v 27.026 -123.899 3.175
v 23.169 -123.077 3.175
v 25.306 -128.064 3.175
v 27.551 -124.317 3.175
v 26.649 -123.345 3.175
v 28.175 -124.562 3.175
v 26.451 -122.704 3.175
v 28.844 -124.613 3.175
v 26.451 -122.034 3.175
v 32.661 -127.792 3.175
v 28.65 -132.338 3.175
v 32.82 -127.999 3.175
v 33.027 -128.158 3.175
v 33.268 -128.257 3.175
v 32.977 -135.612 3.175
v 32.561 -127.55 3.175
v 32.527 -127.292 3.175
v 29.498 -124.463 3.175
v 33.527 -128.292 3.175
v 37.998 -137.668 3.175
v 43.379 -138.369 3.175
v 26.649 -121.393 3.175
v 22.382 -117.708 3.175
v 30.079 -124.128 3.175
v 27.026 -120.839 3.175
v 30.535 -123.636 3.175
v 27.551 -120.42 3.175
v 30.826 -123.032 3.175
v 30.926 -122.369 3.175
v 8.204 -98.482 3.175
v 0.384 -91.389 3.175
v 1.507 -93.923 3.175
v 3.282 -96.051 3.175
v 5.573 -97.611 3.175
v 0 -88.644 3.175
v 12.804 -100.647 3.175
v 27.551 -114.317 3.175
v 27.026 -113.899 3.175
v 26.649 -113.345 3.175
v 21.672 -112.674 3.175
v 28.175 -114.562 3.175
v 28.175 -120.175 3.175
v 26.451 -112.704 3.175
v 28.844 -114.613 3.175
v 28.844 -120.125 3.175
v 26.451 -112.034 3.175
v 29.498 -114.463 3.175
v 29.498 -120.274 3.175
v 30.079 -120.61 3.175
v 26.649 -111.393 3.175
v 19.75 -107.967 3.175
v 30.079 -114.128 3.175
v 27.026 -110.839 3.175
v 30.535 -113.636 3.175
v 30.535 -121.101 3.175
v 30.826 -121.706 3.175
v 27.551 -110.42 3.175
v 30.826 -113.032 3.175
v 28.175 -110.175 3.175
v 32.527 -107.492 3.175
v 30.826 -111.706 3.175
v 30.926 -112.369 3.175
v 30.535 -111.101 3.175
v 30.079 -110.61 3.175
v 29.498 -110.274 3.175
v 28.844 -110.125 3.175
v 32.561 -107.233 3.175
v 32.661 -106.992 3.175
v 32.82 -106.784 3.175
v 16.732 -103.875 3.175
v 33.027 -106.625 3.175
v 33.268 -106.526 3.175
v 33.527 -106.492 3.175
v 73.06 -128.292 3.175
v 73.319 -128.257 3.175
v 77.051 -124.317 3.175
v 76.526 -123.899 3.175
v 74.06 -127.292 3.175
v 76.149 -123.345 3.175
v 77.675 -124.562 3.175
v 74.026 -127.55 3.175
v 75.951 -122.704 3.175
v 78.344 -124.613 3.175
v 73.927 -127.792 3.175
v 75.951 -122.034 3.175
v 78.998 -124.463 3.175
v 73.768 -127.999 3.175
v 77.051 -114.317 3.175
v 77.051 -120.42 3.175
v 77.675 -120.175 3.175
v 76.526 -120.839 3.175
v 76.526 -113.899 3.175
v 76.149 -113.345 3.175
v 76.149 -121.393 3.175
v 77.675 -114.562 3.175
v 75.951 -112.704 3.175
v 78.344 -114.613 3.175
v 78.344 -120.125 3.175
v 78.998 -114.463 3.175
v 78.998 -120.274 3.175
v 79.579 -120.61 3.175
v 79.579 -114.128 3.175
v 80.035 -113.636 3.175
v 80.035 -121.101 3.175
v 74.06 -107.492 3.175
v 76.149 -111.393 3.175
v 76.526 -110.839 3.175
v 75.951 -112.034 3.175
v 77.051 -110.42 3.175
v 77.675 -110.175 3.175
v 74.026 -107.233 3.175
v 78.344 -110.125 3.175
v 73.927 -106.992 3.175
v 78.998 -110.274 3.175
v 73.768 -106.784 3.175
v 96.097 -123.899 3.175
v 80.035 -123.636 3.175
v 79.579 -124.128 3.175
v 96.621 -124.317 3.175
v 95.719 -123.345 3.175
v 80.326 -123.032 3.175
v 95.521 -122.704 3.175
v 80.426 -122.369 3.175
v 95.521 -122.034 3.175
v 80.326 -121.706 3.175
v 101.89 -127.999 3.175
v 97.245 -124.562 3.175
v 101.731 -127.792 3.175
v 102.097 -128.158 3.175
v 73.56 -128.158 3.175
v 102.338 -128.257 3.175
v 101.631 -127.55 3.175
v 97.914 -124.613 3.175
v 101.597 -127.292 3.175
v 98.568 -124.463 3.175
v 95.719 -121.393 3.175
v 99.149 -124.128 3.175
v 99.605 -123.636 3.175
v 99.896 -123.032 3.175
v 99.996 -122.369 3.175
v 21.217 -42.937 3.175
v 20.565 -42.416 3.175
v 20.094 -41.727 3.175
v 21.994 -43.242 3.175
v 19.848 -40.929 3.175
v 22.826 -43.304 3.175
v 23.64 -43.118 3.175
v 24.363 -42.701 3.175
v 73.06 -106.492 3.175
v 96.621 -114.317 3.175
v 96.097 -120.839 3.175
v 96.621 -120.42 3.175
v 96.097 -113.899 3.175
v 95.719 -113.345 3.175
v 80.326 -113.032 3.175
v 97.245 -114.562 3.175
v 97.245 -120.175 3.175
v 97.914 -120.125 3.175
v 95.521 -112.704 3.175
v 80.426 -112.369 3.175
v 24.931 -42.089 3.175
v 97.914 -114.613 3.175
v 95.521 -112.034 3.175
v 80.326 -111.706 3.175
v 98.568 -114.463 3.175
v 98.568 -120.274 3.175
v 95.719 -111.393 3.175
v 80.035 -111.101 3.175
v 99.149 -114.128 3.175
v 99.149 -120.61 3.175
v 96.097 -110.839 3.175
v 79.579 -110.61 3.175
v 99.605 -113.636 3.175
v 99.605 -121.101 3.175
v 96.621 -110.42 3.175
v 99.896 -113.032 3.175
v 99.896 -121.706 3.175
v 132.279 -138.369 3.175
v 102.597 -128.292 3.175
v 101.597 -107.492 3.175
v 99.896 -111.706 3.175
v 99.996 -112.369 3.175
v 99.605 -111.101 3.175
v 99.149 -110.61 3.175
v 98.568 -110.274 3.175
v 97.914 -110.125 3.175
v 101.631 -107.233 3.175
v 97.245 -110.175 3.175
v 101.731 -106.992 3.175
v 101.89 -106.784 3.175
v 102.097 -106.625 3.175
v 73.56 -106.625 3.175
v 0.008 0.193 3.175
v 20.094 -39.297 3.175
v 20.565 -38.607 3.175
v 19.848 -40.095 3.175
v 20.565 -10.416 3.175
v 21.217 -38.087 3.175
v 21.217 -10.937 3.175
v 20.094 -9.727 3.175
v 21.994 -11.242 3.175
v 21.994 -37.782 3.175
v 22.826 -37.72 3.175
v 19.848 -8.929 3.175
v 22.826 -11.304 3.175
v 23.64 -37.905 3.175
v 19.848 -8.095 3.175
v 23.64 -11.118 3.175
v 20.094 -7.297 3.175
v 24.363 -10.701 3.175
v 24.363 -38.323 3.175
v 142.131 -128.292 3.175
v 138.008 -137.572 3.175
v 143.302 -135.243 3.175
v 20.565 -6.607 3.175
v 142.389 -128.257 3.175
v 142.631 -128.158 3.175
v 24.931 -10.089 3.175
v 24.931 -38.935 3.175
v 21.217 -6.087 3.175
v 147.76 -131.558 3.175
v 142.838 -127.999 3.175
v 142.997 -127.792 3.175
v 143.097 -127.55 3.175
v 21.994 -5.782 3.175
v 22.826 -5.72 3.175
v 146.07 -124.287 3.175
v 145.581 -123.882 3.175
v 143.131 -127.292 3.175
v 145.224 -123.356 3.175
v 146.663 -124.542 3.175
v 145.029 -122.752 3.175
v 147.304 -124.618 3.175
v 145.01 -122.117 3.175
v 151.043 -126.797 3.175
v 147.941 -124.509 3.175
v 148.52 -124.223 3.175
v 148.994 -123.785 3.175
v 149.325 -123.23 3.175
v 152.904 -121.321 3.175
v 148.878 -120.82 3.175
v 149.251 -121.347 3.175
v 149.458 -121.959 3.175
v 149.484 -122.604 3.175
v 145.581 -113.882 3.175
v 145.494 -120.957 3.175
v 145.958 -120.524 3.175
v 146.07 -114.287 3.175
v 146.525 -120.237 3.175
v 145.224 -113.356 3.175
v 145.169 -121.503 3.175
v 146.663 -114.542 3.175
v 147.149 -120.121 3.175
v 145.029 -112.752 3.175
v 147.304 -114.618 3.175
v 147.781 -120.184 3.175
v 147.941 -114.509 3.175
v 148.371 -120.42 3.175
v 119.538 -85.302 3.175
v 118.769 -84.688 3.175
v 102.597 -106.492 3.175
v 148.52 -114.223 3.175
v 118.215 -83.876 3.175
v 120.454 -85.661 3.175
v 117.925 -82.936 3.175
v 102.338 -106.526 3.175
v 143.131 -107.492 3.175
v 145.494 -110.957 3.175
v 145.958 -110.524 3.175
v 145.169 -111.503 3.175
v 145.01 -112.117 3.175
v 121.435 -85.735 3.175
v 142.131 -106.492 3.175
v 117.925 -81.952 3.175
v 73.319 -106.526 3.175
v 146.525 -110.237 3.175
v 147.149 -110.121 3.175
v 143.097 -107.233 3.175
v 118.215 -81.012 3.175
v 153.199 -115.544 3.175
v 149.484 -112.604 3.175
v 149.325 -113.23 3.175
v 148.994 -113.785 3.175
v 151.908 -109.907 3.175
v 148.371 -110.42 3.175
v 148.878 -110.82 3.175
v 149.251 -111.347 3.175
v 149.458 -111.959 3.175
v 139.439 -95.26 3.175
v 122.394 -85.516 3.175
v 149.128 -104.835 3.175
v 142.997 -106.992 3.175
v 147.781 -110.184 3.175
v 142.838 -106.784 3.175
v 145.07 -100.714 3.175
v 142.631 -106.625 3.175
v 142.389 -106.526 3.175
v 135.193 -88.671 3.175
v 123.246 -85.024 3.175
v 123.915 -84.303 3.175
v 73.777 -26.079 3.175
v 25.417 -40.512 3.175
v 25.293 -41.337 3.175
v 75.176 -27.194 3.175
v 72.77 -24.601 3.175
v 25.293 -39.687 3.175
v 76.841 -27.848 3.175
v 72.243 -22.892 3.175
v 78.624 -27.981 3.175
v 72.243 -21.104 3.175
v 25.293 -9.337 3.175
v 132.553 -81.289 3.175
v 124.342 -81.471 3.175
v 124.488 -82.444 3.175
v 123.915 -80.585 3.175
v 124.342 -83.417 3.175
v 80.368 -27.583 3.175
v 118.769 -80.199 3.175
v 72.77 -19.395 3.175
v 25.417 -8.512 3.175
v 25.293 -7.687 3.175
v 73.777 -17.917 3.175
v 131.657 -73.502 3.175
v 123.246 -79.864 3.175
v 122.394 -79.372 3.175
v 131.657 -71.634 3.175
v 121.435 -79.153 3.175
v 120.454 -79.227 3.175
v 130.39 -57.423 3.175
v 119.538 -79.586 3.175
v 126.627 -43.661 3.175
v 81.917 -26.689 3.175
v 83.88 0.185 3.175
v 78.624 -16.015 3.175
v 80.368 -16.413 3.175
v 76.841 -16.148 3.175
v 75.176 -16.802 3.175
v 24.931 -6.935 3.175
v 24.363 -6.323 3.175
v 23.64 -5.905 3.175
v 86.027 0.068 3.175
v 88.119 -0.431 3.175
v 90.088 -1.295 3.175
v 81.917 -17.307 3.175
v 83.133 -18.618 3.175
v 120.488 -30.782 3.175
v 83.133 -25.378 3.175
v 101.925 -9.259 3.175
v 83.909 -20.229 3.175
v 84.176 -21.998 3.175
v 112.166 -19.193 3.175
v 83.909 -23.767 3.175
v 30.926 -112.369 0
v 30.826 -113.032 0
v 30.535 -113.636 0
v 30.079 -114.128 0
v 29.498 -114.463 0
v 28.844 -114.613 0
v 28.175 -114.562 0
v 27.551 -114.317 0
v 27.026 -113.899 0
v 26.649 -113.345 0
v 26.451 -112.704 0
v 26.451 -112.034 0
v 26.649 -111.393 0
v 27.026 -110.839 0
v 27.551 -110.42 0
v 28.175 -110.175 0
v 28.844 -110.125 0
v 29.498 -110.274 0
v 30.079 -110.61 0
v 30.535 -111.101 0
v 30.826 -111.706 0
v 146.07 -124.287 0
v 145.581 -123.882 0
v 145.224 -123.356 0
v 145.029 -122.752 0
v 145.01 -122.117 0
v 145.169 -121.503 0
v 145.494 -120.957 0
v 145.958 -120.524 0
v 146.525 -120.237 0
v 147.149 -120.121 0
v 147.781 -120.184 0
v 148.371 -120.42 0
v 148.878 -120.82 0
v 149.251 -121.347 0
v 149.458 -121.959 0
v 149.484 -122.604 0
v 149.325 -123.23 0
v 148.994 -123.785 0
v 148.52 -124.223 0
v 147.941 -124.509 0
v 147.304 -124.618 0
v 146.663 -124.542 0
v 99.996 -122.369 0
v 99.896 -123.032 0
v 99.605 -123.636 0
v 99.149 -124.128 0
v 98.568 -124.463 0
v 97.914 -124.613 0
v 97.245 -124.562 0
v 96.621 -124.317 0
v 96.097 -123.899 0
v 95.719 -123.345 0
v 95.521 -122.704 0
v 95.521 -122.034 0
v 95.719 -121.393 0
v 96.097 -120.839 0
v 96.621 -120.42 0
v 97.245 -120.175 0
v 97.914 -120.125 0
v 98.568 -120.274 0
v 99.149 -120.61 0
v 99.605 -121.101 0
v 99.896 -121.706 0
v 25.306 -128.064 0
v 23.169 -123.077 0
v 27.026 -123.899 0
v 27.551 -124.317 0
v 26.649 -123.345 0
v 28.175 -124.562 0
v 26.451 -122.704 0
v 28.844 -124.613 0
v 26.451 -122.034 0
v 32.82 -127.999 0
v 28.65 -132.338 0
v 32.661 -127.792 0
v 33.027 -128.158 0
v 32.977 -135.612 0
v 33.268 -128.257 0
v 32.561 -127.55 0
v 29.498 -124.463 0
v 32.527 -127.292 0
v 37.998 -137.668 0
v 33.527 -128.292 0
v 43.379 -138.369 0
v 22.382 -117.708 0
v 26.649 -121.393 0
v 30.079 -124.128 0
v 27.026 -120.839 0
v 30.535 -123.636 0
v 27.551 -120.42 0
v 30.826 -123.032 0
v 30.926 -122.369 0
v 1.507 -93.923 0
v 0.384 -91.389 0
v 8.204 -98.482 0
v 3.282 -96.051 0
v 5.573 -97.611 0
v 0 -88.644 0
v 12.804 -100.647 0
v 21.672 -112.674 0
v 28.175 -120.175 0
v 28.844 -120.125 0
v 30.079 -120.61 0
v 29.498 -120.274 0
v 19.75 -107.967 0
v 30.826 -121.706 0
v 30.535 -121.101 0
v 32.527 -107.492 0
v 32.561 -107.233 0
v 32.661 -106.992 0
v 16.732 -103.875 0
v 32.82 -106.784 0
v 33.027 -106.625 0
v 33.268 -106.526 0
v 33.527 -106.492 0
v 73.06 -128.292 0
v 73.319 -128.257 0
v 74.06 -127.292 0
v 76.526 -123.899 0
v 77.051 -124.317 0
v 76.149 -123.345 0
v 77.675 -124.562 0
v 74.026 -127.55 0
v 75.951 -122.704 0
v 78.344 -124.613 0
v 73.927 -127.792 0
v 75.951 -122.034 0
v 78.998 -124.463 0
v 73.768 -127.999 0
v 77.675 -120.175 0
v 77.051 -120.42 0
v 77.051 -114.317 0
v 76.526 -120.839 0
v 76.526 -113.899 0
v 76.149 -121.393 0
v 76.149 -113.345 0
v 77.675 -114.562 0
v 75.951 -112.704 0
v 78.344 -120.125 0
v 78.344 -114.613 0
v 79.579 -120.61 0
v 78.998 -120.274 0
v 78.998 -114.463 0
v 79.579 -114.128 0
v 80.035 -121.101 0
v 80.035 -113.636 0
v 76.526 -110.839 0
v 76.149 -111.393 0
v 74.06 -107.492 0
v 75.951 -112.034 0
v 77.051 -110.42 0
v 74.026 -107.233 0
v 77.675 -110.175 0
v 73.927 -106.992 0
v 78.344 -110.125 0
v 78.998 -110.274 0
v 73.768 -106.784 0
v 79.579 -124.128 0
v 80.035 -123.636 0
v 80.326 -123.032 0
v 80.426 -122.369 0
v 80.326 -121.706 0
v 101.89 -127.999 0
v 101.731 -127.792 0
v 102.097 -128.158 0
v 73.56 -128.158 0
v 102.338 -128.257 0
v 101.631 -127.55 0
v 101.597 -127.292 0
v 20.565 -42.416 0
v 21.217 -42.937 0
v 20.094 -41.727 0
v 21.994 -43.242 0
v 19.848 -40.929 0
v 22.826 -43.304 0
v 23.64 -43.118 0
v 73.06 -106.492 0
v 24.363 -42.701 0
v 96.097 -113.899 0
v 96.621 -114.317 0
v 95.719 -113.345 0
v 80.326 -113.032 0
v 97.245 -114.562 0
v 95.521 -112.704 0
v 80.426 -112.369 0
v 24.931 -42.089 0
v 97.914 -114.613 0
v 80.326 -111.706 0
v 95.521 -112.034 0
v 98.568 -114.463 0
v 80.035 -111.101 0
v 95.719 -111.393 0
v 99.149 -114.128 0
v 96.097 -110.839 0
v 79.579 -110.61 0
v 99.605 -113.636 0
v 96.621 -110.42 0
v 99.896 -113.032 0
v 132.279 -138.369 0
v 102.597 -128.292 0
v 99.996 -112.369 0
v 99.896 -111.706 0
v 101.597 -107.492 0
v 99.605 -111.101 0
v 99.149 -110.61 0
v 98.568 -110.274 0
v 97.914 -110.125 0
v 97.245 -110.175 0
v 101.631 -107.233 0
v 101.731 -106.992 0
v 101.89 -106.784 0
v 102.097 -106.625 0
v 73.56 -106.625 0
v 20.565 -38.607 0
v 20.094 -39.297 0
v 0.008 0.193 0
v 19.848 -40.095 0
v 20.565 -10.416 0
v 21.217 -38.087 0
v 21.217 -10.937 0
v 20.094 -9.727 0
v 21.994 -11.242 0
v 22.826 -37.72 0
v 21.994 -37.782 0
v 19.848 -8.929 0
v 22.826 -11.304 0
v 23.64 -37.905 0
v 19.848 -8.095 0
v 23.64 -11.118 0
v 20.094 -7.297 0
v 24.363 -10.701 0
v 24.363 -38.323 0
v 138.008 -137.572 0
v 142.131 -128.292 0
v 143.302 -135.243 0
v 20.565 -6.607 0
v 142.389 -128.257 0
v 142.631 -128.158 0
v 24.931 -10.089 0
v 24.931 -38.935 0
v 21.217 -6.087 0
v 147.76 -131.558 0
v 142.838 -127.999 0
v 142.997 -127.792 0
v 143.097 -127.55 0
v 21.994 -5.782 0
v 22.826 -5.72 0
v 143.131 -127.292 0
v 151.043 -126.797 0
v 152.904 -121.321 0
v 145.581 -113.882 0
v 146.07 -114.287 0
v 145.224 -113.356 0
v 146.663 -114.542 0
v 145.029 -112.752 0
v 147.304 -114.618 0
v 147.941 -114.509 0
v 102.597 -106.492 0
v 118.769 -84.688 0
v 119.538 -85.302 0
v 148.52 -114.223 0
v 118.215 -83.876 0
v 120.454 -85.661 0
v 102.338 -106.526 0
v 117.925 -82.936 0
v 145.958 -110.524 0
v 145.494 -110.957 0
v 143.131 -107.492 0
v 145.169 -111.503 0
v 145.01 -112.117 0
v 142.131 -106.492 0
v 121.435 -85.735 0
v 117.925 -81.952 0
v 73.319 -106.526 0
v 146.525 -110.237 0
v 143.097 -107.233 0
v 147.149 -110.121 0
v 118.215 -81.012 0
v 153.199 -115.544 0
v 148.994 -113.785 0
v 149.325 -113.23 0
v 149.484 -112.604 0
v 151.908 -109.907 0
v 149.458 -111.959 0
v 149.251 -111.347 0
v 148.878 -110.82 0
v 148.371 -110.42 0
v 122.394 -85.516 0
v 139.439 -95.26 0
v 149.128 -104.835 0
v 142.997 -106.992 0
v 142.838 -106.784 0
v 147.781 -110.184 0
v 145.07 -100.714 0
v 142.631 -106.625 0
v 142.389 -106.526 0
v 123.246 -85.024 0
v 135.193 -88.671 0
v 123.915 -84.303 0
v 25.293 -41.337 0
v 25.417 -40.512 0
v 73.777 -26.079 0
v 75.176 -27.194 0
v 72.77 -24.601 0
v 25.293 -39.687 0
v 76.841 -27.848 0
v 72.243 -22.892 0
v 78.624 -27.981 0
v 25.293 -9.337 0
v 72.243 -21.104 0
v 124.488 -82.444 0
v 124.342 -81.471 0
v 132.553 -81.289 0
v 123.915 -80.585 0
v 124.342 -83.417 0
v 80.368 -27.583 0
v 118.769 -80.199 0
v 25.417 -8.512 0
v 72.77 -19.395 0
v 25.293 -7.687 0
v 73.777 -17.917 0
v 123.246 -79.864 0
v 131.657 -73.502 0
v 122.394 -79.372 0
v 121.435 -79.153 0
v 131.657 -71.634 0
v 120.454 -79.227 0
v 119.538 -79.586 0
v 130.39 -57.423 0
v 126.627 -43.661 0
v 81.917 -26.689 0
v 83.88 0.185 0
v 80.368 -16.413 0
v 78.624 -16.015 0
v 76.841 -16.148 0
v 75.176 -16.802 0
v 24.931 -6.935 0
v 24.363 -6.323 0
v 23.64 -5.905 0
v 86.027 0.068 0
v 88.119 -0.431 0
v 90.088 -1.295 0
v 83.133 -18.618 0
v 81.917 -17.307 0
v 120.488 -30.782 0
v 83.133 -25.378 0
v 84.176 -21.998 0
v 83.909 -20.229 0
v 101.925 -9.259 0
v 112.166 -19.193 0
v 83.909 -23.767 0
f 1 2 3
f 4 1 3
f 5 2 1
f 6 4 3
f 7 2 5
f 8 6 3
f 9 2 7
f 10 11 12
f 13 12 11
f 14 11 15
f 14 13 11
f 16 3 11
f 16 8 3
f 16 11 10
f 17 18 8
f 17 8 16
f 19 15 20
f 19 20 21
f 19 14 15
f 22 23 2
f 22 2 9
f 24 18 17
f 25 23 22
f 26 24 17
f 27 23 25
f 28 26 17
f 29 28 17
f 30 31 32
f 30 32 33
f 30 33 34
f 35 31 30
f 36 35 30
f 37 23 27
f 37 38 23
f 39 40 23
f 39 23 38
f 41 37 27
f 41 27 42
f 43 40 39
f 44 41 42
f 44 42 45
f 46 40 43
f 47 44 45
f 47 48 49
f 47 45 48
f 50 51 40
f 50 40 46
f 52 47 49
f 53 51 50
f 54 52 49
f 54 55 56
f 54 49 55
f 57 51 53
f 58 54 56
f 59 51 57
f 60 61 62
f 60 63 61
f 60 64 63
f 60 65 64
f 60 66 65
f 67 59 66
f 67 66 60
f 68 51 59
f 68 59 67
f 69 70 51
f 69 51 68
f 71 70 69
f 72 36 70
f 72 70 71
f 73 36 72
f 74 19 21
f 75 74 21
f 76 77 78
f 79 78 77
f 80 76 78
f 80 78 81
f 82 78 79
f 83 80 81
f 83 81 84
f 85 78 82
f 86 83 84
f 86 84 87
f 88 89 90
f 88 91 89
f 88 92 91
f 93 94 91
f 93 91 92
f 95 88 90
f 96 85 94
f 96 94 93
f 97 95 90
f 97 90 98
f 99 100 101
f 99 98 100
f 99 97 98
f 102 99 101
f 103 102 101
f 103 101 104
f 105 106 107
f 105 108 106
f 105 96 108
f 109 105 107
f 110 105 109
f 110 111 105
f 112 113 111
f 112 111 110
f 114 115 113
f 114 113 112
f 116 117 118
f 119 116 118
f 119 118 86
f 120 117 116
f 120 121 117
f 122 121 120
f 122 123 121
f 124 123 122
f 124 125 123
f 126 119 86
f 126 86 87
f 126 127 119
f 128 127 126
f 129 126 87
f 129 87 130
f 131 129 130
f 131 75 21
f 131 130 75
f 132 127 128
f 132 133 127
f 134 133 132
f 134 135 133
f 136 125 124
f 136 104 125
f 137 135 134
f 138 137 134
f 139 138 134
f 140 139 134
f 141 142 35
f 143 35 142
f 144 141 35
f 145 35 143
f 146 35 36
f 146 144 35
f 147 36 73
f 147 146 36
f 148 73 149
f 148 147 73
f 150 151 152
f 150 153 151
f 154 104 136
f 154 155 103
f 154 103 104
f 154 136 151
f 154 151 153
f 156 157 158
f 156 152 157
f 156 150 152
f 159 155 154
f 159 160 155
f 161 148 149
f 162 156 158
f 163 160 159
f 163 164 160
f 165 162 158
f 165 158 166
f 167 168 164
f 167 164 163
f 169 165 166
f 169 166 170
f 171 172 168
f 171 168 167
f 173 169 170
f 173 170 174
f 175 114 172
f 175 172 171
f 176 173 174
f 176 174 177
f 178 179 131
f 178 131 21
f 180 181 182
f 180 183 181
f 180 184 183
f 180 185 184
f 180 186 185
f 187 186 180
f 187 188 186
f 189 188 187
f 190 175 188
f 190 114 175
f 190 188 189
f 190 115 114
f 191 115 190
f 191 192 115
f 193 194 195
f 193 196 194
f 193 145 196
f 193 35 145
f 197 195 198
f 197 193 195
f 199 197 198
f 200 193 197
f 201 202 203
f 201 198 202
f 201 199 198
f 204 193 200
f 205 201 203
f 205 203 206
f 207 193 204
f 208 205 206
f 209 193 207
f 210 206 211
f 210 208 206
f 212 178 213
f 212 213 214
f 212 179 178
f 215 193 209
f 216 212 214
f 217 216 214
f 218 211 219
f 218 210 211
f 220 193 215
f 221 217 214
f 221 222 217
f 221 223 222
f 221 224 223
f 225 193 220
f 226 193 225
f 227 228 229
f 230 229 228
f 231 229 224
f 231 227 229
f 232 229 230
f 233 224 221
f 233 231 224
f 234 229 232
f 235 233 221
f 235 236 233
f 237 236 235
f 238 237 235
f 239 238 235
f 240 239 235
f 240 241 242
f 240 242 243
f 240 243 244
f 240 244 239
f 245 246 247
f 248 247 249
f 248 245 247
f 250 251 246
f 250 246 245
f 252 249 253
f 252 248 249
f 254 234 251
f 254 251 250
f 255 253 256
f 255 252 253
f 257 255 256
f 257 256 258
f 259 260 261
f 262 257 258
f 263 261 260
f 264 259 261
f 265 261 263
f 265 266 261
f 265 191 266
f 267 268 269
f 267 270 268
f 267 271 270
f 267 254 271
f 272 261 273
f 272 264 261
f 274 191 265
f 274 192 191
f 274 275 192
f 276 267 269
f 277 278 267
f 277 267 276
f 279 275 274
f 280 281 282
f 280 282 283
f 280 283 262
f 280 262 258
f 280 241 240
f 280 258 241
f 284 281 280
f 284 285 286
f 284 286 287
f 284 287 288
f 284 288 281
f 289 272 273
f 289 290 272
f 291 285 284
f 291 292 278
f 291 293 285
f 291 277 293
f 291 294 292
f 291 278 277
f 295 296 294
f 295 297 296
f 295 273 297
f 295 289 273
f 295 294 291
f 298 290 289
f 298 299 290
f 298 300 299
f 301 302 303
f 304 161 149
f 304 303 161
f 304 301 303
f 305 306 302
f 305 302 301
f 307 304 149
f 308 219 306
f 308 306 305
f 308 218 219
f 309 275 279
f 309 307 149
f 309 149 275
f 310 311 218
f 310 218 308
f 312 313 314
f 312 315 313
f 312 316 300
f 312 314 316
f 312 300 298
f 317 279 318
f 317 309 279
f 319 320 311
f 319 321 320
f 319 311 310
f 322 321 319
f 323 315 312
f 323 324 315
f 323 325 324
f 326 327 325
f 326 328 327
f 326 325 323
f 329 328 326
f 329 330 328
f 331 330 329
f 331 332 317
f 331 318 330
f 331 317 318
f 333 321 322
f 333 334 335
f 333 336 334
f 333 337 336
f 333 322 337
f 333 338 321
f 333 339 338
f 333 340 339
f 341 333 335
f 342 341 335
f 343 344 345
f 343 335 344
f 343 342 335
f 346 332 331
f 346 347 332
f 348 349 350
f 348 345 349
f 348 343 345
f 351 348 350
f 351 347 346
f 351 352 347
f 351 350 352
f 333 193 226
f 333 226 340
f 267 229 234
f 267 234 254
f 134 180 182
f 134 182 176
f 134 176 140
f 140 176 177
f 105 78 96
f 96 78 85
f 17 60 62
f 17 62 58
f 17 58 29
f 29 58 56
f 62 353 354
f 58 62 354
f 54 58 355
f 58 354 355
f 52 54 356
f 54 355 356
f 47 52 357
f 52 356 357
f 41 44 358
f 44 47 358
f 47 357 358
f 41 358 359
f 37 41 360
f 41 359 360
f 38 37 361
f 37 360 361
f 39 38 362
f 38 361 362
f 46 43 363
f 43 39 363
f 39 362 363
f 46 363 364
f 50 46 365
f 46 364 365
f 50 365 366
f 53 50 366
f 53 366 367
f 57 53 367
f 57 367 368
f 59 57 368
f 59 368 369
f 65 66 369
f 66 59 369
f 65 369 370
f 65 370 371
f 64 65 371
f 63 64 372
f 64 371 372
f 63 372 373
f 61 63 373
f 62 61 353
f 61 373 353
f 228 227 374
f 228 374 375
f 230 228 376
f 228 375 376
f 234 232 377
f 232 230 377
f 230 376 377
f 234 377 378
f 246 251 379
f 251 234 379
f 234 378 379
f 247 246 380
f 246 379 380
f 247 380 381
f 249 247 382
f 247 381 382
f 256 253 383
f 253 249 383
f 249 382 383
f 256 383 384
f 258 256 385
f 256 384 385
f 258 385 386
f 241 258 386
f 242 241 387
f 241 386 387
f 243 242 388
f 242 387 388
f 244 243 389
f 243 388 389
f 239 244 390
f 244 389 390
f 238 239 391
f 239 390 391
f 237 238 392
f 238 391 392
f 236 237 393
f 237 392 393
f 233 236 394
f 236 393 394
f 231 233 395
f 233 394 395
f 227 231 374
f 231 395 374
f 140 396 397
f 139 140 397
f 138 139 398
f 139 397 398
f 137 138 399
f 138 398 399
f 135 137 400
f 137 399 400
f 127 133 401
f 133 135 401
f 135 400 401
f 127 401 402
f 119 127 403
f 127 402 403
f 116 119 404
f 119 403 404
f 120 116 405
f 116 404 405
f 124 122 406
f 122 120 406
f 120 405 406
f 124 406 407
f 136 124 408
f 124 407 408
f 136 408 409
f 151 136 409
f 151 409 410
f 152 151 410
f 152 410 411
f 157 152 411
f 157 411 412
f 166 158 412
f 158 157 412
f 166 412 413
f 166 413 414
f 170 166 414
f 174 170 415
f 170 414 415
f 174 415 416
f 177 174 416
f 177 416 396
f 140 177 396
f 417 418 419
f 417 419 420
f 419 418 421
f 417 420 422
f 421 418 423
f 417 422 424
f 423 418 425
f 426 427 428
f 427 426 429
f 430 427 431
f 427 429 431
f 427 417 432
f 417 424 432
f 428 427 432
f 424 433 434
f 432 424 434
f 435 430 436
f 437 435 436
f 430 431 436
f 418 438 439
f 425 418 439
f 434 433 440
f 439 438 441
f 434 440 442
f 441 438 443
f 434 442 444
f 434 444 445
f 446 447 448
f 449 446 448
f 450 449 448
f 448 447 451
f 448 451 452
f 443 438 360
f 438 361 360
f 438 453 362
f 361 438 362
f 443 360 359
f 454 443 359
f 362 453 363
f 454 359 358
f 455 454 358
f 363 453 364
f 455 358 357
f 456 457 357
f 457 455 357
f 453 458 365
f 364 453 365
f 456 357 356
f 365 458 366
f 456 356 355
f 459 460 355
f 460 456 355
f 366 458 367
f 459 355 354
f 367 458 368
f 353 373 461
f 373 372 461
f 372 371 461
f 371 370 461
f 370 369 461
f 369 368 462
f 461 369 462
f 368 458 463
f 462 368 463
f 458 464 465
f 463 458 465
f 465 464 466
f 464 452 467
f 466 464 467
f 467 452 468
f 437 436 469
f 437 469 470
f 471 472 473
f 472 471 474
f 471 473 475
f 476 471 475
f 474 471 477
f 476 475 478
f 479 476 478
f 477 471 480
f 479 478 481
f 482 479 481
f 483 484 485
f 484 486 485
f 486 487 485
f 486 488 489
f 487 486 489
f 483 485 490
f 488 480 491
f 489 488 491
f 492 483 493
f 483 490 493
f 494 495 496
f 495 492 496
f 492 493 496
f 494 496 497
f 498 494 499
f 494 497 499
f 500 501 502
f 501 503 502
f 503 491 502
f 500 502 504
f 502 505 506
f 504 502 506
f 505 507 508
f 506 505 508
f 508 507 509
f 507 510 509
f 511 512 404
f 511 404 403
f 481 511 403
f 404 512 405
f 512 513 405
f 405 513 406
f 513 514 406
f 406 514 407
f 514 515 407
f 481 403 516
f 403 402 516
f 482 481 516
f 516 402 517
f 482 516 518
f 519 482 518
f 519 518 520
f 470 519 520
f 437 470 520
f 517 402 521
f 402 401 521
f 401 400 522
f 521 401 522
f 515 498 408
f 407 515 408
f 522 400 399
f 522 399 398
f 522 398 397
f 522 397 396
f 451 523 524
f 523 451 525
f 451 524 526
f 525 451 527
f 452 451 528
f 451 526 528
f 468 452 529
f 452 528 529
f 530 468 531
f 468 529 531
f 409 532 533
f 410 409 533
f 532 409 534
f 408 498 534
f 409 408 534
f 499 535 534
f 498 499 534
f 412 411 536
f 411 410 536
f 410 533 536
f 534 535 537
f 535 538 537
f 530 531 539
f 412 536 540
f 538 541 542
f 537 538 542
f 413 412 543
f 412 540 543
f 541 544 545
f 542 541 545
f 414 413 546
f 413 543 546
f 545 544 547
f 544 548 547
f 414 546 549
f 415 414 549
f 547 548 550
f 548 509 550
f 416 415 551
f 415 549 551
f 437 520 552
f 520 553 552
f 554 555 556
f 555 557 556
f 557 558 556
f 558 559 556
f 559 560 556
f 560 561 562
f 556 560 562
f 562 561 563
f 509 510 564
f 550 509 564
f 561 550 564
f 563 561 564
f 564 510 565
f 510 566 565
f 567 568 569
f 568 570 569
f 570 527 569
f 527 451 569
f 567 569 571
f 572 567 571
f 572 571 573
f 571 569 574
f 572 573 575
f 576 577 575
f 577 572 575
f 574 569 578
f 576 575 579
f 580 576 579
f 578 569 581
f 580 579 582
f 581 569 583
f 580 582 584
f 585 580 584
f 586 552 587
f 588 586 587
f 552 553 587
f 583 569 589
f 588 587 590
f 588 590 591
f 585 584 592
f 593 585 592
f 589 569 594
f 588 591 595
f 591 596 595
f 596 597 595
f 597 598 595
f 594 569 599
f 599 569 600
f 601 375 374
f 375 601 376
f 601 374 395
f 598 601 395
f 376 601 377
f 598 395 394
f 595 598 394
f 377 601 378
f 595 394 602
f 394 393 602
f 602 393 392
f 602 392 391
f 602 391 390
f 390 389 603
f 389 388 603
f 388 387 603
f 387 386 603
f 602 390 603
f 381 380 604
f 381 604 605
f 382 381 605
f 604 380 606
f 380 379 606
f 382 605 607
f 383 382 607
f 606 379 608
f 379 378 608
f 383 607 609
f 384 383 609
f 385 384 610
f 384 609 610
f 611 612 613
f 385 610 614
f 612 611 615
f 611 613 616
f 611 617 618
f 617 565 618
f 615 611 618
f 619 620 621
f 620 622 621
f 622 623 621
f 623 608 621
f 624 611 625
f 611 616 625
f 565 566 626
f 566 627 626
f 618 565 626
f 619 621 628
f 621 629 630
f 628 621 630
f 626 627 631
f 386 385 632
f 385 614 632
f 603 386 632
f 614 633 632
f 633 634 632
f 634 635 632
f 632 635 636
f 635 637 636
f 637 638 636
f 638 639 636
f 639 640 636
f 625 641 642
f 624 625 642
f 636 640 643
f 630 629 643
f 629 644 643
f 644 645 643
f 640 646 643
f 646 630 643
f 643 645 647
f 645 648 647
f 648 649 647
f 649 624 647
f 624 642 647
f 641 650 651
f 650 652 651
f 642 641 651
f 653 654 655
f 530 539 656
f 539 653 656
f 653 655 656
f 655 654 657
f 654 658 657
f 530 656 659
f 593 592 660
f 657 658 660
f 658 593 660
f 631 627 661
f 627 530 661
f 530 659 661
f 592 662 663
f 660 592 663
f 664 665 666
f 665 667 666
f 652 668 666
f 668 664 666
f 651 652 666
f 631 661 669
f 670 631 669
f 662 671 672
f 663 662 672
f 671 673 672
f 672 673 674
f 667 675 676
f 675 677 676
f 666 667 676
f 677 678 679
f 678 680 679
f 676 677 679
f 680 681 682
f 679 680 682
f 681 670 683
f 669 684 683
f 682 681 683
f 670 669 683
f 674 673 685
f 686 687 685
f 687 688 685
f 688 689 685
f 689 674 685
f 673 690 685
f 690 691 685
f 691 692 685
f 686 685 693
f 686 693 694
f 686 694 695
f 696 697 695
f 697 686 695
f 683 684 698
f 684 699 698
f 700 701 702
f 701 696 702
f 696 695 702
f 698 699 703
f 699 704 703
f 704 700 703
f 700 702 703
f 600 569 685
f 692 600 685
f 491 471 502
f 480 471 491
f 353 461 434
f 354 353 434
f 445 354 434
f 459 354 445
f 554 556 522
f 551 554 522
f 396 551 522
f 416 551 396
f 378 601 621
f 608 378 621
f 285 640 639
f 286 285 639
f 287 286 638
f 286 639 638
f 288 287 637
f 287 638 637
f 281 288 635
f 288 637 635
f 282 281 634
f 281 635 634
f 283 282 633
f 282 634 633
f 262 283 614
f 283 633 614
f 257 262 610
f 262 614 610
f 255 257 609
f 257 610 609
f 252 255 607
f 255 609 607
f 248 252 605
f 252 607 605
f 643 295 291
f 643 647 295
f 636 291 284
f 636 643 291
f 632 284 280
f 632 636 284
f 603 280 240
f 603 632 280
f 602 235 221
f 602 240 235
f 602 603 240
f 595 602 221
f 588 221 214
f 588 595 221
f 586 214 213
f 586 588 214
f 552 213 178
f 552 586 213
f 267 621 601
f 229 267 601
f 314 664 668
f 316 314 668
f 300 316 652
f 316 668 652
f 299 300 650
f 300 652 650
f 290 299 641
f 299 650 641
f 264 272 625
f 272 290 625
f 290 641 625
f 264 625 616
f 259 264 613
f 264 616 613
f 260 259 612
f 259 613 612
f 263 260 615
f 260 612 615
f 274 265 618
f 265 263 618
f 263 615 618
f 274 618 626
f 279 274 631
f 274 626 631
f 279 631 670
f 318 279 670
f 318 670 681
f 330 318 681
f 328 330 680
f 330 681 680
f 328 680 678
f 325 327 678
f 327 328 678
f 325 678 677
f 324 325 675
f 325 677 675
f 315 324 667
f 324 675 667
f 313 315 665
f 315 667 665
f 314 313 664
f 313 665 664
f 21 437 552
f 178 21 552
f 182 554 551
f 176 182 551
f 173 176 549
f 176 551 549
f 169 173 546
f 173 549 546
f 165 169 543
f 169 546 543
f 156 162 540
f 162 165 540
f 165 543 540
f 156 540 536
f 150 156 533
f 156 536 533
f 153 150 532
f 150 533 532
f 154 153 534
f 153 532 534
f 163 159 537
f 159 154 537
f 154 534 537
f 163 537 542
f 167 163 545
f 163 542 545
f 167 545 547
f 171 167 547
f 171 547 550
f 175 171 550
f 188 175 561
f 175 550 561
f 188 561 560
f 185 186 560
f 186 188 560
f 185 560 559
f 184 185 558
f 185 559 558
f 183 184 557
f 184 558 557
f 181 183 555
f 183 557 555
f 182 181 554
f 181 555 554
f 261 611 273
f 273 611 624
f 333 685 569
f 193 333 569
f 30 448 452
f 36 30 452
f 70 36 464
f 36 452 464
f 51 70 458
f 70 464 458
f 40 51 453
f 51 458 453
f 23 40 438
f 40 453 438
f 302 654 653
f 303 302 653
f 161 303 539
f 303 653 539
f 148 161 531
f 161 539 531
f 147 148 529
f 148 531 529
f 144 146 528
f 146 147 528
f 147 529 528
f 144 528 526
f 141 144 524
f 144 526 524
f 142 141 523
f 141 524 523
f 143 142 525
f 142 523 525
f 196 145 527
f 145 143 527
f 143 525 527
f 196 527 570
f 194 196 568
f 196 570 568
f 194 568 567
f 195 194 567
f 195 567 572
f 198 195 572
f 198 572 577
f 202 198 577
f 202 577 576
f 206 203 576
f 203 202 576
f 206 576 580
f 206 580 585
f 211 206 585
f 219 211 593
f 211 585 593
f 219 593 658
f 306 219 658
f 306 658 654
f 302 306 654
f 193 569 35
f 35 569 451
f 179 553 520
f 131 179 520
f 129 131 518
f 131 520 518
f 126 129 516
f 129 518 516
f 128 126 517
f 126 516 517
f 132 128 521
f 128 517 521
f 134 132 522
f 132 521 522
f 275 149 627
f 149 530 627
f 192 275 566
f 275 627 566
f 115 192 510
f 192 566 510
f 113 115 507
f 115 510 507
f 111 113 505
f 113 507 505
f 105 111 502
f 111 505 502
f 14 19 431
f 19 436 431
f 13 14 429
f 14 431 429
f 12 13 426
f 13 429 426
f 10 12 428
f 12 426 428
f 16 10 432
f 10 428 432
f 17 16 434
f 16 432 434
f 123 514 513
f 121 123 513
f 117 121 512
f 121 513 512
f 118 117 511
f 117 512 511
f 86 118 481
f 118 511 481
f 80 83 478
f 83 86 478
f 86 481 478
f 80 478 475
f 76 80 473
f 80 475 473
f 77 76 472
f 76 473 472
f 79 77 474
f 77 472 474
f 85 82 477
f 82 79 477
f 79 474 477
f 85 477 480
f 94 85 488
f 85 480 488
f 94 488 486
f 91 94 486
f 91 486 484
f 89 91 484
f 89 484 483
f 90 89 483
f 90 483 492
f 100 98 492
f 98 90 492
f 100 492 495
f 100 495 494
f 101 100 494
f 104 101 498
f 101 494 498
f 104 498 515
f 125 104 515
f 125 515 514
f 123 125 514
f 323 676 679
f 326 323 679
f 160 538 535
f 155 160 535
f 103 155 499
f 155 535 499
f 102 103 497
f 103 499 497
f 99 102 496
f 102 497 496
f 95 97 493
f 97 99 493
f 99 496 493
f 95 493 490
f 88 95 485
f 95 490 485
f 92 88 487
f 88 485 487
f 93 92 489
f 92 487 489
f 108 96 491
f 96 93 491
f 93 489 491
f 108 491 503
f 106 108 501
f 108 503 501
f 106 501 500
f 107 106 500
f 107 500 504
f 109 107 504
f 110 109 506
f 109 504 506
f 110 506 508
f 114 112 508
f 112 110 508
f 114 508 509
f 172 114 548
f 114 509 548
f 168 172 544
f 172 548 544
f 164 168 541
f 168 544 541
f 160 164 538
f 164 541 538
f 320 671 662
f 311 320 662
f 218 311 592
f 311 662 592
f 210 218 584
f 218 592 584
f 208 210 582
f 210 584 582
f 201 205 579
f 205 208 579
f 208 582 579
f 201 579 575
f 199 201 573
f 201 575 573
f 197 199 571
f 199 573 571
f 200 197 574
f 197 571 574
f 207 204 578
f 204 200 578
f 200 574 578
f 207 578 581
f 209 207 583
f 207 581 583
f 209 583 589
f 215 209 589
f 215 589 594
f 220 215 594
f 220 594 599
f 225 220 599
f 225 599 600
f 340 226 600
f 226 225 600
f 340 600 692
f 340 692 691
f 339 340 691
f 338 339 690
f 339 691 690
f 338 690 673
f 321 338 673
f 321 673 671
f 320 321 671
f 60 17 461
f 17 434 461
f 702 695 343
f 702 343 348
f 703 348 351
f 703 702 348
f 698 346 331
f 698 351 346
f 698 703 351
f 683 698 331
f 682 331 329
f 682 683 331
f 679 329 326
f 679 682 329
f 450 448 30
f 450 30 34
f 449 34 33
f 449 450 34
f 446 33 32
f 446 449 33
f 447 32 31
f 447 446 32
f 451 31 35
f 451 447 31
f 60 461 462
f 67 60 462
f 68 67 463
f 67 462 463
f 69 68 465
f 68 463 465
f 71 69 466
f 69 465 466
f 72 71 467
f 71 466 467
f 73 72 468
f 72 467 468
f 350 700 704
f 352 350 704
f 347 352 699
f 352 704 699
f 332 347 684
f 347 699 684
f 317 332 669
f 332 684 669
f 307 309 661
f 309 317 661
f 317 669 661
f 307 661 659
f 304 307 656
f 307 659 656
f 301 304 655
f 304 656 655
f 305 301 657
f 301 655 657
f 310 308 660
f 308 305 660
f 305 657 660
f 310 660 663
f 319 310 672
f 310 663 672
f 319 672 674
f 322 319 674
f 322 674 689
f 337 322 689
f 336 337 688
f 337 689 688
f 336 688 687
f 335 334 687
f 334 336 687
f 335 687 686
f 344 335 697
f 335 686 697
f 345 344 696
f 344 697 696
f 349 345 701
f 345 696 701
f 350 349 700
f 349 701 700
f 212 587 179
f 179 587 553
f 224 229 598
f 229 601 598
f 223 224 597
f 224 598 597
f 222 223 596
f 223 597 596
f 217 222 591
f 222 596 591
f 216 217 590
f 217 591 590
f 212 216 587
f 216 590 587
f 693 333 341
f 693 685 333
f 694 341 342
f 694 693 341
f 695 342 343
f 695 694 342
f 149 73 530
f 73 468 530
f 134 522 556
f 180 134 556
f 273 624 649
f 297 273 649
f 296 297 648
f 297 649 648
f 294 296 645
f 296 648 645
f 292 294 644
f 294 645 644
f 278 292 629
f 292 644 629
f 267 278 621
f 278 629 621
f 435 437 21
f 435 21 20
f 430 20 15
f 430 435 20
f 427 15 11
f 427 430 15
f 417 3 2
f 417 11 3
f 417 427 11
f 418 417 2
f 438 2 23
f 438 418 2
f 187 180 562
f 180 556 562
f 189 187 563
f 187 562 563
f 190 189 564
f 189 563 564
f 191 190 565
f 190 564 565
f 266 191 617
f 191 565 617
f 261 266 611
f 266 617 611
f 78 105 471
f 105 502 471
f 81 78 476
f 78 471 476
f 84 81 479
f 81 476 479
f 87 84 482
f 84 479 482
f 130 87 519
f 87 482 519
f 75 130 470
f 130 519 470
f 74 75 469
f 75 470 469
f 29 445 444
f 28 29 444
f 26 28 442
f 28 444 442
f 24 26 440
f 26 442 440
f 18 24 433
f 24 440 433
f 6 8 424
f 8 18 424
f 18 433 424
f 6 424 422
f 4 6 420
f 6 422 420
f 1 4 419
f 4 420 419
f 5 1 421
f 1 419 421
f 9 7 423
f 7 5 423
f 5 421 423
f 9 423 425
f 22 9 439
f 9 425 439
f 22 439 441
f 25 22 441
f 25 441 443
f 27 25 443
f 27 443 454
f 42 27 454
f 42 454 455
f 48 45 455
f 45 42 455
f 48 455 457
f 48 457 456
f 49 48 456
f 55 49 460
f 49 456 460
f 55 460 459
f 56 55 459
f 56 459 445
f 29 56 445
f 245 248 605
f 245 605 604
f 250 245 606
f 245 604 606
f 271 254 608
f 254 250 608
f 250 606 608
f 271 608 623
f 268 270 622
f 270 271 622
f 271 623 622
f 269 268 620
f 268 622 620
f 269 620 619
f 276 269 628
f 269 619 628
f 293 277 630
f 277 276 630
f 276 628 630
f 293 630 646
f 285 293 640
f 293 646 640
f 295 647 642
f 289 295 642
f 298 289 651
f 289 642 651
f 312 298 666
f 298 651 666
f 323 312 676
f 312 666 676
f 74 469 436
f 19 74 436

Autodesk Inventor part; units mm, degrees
ref_plane "YZ Plane" through (0, 0, 0) normal (1, 0, 0) x (0, 1, 0)
ref_plane "XZ Plane" through (0, 0, 0) normal (0, 1, 0) x (-1, 0, 0)
ref_plane "XY Plane" through (0, 0, 0) normal (0, 0, 1) x (1, 0, 0)
sketch "Sketch1" plane through (0, 0, 0) normal (0, 0, 1) x (1, 0, 0)
  line L0 (131.6573, -73.5015) -> (131.6573, -71.6343)
  arc A0 (131.6573, -71.6343) -> (90.0875, -1.2951) centre (51.3628, -71.6343) ccw
  arc A1 (90.0875, -1.2951) -> (83.8803, 0.1854) centre (84.3001, -11.8073) ccw
  line L1 (83.8803, 0.1854) -> (0.0078, 0.1927)
  line L2 (0.0078, 0.1927) -> (0, -88.6441)
  arc A2 (0, -88.6441) -> (8.2038, -98.4815) centre (10, -88.6441) ccw
  circle A3 centre (121.1882, -82.4439) radius 3.3
  arc A4 (146.0697, -114.2869) -> (148.3706, -110.4201) centre (147.2459, -112.3689) ccw
  circle A5 centre (97.7459, -122.3689) radius 2.25
  circle A6 centre (97.7459, -112.3689) radius 2.25
  circle A7 centre (78.1758, -122.3689) radius 2.25
  arc A8 (146.0697, -124.2869) -> (148.3706, -120.4201) centre (147.2459, -122.3689) ccw
  circle A9 centre (22.6171, -8.5119) radius 2.8
  circle A10 centre (22.6171, -40.5119) radius 2.8
  circle A11 centre (28.6758, -122.3689) radius 2.25
  circle A12 centre (28.6758, -112.3689) radius 2.25
  circle A13 centre (78.1758, -112.3689) radius 2.25
  circle A14 centre (10, -88.6441) radius 3.3
  line L3 (73.0605, -128.2915) -> (33.527, -128.2915)
  arc A15 (32.527, -127.2915) -> (33.527, -128.2915) centre (33.527, -127.2915) ccw
  line L4 (32.527, -127.2915) -> (32.527, -107.4915)
  arc A16 (33.527, -106.4915) -> (32.527, -107.4915) centre (33.527, -107.4915) ccw
  line L5 (33.527, -106.4915) -> (73.0605, -106.4915)
  arc A17 (74.0605, -107.4915) -> (73.0605, -106.4915) centre (73.0605, -107.4915) ccw
  line L6 (74.0605, -107.4915) -> (74.0605, -127.2915)
  arc A18 (73.0605, -128.2915) -> (74.0605, -127.2915) centre (73.0605, -127.2915) ccw
  line L7 (142.1306, -128.2915) -> (102.597, -128.2915)
  arc A19 (101.597, -127.2915) -> (102.597, -128.2915) centre (102.597, -127.2915) ccw
  line L8 (101.597, -127.2915) -> (101.597, -107.4915)
  arc A20 (102.597, -106.4915) -> (101.597, -107.4915) centre (102.597, -107.4915) ccw
  line L9 (102.597, -106.4915) -> (142.1306, -106.4915)
  arc A21 (143.1306, -107.4915) -> (142.1306, -106.4915) centre (142.1306, -107.4915) ccw
  line L10 (143.1306, -107.4915) -> (143.1306, -127.2915)
  arc A22 (142.1306, -128.2915) -> (143.1306, -127.2915) centre (142.1306, -127.2915) ccw
  circle A23 centre (147.2459, -112.3689) radius 2.25
  circle A24 centre (147.2459, -122.3689) radius 2.25
  line L11 (28.6758, -112.3689) -> (147.2459, -112.3689) construction
  line L12 (28.6758, -122.3689) -> (147.2459, -122.3689) construction
  circle A25 centre (43.3788, -117.3688) radius 6
  circle A26 centre (22.6171, -40.5119) radius 2.8 projected
  circle A27 centre (22.6171, -8.5119) radius 2.8 projected
  circle A28 centre (132.2788, -117.3688) radius 6
  circle A29 centre (78.1758, -21.998) radius 3.25
  circle A30 centre (78.1758, -21.998) radius 6
  arc A31 (132.2788, -138.3688) -> (145.0698, -100.7137) centre (132.2788, -117.3688) ccw
  arc A32 (22.3815, -117.7081) -> (8.2038, -98.4815) centre (1.805, -118.0406) ccw
  line L13 (43.3788, -138.3688) -> (132.2788, -138.3688)
  arc A33 (131.6573, -73.5015) -> (145.0698, -100.7137) centre (165.9686, -73.5015) ccw
  arc A34 (22.3815, -117.7081) -> (43.3788, -138.3688) centre (43.3788, -117.3688) ccw
  point P0 (0, 0)
  point P1 (58.8546, -117.3689)
  dimension "d2" = 49.5
  dimension "d3" = 49.5
  dimension "d4" = 49.5
  dimension "d5" = 49.5
  dimension "d6" = 10
  dimension "d7" = 12
  dimension "d10" = 88.9
  dimension "d11" = 42
  dimension "d13" = 10.8518
  dimension "d14" = 10.8518
  dimension "d15" = 4.1153
  dimension "d16" = 4.1153
  dimension "d17" = 4.1153
  dimension "d18" = 78.17
extrude "Extrusion1" add sketch "Sketch1" along normal blind 3.175 contours A33 A31 L13 A34 A32 A2 L2 L1 A1 A0 L0 | A14
equation "\"d14\" = d13"
equation "\"d16\" = d15"
equation "\"d17\" = d15"
properties part number "Intake Sides V5_servo" material "Polycarbonate, Clear"
